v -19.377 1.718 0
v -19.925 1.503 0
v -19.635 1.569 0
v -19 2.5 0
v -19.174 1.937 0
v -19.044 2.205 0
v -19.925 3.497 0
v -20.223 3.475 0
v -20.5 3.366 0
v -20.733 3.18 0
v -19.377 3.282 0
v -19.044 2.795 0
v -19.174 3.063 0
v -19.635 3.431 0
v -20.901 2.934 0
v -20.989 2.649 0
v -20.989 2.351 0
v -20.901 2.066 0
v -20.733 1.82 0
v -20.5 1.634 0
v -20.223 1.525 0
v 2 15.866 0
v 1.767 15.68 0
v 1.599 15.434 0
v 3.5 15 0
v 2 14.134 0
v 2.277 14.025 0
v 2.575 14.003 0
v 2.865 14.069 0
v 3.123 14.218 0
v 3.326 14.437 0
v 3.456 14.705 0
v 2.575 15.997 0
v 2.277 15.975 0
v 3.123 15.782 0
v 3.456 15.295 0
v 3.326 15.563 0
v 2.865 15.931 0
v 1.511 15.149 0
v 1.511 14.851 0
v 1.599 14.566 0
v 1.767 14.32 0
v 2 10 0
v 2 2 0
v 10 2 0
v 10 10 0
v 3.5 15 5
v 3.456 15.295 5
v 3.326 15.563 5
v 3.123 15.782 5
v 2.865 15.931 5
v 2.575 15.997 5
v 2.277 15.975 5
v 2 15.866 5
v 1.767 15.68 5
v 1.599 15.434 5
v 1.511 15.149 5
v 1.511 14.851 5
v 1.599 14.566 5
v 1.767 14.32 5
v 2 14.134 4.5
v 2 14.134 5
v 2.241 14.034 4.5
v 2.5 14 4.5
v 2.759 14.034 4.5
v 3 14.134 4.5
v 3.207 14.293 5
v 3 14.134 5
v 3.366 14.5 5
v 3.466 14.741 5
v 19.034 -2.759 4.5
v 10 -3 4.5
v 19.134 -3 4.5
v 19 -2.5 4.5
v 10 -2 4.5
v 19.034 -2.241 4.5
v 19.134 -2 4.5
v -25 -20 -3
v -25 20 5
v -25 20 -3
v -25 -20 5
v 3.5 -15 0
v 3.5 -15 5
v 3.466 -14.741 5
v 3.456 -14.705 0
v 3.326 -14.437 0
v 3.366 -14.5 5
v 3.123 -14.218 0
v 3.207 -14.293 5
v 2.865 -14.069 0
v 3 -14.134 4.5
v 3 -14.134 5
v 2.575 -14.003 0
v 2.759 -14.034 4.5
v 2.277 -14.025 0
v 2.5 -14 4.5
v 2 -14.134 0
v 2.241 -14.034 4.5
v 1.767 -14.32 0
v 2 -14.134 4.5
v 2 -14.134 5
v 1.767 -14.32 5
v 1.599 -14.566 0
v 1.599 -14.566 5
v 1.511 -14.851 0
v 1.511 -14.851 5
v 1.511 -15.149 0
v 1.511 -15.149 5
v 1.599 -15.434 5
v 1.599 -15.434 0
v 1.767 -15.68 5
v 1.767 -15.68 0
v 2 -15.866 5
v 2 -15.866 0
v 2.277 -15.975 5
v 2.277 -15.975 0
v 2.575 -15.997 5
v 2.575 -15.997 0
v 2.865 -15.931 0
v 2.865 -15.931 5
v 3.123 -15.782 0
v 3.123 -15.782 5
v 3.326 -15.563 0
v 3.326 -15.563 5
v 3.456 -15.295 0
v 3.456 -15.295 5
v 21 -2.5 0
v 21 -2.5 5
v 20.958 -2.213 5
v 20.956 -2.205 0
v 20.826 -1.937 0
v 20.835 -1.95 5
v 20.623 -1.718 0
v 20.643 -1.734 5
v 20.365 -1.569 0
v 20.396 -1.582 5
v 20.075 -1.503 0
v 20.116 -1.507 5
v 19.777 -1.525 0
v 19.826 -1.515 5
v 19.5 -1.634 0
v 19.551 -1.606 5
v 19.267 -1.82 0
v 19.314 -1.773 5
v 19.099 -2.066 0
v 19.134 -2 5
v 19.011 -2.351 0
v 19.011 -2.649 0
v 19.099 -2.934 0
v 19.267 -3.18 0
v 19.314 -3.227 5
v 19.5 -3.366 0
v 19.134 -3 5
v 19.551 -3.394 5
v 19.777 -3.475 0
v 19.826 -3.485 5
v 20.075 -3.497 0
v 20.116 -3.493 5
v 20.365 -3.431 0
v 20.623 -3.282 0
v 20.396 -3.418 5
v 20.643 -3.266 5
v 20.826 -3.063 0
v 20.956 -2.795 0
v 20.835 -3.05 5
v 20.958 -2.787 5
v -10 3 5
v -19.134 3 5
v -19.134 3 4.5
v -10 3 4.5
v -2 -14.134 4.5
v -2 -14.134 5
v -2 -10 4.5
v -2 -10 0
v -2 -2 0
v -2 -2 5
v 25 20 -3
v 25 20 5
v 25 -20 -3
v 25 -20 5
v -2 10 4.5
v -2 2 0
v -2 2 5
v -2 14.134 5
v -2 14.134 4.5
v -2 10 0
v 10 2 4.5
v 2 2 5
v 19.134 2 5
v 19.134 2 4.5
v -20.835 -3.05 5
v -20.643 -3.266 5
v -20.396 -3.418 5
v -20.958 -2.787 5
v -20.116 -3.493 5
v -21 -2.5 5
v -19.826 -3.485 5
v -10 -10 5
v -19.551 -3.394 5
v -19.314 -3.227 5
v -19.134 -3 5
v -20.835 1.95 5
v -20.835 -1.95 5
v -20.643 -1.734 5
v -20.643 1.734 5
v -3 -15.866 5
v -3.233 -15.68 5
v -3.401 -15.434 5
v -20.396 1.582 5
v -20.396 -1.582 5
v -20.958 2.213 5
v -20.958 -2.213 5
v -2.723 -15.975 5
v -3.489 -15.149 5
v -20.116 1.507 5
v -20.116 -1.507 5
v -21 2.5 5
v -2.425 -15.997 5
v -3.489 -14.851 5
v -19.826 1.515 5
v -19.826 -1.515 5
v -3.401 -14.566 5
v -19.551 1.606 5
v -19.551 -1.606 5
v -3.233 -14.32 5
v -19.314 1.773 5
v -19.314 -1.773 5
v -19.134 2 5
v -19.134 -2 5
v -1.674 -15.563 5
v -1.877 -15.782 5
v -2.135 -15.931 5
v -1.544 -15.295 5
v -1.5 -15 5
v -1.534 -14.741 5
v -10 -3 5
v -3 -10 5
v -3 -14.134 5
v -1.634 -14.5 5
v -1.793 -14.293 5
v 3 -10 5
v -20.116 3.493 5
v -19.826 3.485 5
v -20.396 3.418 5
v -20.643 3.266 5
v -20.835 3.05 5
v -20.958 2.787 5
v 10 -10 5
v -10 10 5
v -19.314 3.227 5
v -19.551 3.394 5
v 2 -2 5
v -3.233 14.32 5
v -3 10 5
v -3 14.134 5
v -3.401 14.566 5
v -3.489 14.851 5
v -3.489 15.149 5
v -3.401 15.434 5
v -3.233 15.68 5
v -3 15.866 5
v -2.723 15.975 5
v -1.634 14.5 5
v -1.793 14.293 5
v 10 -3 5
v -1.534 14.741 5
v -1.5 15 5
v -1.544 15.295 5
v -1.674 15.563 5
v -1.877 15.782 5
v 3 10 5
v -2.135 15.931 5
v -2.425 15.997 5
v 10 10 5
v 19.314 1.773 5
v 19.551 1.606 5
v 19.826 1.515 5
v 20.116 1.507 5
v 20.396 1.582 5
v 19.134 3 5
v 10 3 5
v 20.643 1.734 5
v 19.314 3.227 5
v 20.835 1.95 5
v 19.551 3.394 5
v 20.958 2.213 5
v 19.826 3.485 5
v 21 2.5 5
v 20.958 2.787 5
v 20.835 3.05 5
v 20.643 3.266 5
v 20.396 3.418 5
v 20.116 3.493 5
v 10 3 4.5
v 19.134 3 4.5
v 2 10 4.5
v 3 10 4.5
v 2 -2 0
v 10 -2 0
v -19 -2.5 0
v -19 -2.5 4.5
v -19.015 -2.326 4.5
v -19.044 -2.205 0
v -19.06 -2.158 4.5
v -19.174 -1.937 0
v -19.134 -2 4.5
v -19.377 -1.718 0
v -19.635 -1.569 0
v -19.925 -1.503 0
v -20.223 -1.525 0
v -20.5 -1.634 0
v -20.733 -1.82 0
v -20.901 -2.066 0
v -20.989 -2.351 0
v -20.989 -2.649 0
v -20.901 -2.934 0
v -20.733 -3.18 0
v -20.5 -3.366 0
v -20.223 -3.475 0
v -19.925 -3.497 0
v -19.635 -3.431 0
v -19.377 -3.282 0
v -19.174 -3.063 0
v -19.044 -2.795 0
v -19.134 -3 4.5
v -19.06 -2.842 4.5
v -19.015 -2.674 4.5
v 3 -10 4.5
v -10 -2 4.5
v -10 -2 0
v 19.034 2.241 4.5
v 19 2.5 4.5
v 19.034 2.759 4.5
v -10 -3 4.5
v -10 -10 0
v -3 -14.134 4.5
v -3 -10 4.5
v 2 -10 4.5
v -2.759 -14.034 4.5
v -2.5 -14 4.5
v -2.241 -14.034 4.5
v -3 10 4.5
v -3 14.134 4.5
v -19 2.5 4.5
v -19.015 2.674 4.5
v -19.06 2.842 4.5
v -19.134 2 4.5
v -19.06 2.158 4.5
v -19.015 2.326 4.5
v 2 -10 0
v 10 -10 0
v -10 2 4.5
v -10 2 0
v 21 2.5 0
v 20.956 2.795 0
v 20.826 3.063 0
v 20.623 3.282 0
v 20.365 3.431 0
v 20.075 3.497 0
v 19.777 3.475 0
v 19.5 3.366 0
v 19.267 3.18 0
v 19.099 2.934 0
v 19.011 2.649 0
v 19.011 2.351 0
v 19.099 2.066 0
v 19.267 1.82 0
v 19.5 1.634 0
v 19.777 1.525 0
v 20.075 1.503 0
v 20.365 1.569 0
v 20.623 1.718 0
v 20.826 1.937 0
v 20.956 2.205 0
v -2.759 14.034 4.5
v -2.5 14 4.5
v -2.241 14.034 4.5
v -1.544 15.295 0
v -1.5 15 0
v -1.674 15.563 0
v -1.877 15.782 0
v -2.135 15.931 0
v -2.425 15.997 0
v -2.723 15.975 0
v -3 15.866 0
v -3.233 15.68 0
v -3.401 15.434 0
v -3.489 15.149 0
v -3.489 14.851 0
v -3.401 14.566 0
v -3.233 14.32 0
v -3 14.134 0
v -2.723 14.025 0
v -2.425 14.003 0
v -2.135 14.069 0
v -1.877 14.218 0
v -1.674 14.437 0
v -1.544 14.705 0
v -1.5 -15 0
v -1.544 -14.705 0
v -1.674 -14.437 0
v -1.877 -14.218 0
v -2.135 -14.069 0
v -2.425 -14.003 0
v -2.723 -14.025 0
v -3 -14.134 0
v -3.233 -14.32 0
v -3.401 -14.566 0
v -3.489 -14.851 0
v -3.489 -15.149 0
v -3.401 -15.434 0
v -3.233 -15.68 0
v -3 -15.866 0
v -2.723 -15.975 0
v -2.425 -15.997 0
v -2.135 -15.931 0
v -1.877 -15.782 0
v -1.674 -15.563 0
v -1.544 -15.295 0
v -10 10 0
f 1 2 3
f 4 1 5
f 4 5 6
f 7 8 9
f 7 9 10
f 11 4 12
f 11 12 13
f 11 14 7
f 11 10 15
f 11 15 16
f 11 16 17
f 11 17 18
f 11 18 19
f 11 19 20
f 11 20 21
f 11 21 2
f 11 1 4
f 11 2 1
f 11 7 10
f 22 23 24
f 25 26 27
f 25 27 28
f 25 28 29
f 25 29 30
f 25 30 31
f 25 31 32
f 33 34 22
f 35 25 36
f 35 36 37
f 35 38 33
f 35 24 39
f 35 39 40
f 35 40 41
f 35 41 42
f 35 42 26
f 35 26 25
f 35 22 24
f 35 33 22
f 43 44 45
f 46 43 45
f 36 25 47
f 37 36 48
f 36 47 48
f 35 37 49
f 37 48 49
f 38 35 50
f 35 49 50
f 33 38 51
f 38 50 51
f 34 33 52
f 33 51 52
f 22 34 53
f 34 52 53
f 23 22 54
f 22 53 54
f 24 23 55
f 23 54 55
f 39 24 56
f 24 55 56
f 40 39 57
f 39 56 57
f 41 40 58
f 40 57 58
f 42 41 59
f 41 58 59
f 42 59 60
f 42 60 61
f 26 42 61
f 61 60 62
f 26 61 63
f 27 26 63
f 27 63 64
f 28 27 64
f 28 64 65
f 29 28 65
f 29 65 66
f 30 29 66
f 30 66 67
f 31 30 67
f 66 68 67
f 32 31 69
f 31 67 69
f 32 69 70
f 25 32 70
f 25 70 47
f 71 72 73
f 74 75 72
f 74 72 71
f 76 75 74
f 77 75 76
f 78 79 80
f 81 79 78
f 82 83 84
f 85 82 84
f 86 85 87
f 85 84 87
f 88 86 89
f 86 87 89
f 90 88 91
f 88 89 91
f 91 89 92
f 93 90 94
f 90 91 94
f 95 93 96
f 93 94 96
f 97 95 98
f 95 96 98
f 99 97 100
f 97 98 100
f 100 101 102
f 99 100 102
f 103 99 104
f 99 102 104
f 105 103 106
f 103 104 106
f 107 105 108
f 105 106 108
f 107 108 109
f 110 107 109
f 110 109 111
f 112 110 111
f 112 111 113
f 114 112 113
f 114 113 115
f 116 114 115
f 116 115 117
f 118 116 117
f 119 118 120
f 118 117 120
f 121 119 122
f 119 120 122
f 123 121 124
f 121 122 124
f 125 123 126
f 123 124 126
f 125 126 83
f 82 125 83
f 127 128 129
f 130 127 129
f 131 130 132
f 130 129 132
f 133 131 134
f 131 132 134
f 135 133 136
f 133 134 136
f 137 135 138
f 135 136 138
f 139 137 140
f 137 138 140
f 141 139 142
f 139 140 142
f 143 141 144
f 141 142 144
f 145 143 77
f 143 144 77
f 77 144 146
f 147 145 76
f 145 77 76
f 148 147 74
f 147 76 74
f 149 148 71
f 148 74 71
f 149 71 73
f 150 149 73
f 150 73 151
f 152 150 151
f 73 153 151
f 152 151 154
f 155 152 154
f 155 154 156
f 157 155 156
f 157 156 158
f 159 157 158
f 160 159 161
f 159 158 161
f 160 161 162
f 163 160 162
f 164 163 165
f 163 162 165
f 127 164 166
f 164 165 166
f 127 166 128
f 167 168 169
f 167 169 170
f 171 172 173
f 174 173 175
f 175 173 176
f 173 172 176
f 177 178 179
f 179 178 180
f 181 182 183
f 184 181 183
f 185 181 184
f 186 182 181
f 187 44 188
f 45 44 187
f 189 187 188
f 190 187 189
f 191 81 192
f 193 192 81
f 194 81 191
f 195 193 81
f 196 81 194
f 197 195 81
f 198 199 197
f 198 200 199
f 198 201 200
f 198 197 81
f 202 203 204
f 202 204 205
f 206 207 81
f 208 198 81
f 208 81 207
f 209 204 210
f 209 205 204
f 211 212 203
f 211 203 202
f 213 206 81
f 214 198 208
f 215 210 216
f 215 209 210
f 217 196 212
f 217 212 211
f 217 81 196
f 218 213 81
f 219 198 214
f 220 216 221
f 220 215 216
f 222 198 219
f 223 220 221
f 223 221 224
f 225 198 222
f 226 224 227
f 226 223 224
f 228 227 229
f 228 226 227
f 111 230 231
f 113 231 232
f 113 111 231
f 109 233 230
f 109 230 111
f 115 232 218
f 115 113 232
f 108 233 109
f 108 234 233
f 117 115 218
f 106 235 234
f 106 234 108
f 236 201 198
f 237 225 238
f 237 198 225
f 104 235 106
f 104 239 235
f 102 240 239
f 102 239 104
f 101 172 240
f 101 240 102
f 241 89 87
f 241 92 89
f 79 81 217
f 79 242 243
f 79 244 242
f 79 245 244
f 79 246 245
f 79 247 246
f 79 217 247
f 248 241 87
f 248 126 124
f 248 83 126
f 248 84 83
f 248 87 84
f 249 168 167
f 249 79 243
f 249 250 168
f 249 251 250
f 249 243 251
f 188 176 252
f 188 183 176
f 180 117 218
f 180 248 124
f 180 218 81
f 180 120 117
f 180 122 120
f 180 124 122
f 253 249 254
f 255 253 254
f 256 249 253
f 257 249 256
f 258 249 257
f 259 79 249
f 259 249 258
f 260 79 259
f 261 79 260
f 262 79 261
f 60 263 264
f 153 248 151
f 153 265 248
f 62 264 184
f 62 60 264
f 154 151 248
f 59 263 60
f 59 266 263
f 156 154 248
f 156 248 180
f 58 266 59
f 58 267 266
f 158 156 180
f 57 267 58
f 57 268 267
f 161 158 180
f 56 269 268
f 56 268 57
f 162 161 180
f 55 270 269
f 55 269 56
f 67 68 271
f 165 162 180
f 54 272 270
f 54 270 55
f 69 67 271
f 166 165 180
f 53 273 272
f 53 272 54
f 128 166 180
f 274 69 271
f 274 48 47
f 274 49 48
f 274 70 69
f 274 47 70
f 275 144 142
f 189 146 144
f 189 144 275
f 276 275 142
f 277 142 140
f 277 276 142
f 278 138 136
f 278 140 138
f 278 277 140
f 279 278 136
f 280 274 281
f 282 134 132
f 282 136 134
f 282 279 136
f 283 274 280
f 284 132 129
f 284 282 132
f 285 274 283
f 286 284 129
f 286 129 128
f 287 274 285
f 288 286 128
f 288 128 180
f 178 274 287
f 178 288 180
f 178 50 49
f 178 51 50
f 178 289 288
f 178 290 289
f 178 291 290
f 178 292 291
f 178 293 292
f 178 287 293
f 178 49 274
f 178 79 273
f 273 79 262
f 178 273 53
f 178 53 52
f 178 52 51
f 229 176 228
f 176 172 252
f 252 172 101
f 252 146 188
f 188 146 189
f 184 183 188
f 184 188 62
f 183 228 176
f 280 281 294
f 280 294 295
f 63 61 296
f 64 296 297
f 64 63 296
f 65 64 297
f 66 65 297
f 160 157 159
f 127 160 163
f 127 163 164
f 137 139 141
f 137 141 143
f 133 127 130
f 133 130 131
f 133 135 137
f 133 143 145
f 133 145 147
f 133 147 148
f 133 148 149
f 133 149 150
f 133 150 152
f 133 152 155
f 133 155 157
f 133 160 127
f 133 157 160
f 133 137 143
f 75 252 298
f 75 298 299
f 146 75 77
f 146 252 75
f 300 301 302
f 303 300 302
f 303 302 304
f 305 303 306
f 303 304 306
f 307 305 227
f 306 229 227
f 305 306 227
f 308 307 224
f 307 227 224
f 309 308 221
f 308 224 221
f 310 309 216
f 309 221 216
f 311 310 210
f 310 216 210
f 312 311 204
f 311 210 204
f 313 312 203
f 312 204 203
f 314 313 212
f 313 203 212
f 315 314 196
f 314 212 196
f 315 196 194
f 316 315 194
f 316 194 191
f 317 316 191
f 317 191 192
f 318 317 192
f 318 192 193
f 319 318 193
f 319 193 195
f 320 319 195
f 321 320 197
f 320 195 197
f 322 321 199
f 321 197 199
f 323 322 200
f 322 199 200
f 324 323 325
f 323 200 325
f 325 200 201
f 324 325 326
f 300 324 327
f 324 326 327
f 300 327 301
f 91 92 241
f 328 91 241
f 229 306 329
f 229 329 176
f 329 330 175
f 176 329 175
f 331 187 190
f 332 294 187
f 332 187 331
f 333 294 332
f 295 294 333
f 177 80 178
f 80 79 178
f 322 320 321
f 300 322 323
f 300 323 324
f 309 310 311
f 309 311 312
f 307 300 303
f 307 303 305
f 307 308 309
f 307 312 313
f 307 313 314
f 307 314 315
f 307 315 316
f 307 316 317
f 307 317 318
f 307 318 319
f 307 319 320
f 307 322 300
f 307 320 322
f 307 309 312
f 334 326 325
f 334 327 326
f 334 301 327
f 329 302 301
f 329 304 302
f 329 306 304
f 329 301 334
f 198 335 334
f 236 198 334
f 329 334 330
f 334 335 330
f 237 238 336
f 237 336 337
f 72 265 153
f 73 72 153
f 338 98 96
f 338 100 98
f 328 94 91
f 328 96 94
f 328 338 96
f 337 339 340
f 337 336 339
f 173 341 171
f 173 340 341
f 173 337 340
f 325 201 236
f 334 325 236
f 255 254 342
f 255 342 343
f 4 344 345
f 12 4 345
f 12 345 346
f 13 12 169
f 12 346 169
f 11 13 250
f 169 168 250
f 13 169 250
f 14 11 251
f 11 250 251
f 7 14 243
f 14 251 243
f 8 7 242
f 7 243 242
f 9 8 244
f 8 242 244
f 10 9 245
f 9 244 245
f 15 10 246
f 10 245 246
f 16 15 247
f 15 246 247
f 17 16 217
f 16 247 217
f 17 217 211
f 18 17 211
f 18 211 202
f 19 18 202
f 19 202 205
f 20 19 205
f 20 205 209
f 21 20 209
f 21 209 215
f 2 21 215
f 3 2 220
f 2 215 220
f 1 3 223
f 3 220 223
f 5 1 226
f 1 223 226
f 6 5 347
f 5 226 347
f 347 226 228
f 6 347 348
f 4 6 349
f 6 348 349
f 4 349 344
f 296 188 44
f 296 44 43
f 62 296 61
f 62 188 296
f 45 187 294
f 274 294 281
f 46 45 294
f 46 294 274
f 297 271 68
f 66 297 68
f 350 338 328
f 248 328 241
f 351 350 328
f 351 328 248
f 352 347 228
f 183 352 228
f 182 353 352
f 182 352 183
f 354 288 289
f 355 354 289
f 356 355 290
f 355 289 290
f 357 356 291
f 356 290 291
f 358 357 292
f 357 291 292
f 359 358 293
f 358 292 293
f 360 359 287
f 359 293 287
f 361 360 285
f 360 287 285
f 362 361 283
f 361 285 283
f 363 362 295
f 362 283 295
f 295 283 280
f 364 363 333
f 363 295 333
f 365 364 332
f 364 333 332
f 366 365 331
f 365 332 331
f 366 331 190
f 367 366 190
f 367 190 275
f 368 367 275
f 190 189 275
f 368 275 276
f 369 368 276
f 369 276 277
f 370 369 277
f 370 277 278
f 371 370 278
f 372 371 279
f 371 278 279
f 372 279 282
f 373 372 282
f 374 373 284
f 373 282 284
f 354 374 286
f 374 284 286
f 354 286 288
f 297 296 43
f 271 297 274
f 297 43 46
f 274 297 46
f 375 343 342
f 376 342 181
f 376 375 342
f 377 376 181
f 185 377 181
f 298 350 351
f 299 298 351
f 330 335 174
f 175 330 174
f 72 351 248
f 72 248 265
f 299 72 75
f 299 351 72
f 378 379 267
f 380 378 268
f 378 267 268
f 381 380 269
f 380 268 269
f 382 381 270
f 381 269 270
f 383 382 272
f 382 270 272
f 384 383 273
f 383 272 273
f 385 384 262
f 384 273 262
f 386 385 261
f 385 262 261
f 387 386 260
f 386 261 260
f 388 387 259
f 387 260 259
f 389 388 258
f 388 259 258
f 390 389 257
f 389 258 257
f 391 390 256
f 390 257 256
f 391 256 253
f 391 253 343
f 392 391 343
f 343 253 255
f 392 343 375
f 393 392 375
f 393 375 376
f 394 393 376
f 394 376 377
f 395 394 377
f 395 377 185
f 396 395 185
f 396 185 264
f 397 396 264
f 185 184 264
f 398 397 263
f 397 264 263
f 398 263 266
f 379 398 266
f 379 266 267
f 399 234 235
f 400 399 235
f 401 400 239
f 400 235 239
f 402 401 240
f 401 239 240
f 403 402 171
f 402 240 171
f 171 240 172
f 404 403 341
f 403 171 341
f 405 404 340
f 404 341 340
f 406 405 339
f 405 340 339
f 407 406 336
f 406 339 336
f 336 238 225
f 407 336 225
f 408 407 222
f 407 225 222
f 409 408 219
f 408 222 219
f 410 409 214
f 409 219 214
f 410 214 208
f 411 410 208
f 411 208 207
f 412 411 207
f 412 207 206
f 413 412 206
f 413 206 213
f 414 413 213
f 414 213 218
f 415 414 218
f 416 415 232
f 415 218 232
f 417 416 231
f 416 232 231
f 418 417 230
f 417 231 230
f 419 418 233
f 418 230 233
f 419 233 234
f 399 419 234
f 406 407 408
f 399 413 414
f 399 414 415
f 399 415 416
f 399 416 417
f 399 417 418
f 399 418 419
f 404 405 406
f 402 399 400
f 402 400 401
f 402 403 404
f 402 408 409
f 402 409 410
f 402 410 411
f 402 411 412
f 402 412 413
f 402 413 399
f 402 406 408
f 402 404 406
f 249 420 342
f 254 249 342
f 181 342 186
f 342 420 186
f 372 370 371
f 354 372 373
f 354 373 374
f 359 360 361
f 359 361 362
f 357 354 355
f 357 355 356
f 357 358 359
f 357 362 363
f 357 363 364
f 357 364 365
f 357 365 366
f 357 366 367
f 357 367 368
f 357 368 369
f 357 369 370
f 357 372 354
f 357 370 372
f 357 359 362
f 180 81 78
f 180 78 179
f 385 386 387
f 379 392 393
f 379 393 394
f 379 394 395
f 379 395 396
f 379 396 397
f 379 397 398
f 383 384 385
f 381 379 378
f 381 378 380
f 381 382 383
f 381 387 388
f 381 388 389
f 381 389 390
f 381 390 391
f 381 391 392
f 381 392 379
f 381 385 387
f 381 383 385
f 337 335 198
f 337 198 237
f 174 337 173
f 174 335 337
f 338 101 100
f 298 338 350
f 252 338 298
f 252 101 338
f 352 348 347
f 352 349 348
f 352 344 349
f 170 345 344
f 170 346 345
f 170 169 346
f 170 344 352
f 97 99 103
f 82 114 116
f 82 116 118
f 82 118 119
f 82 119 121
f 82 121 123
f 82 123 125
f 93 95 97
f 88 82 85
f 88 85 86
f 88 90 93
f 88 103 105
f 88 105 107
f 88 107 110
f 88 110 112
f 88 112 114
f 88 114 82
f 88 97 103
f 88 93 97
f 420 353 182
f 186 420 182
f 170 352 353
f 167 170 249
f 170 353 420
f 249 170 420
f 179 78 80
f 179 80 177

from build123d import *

# Parameters (mm, degrees)
F0_W     = 8
F0_H     = 8
F1_DEPTH = 5
F2_W     = 50
F2_H     = 40
F3_DEPTH = 3
F4_W     = 1
F4_H     = 5
F4_W_2   = 10
F4_H_2   = 1
F5_DEPTH = 0.5
F6_R     = 1
F7_DEPTH = 5


with BuildPart() as f1:
    # F0 (on Top) → F1 (new body)
    with BuildSketch(Plane.XY):
        Polygon((-25, -20), (25, -20), (25, 20), (-10, 20), (-25, 20), align=None)
        with Locations((-6, -6)):
            Rectangle(F0_W, F0_H, mode=Mode.SUBTRACT)
        with Locations((6, -6)):
            Rectangle(F0_W, F0_H, mode=Mode.SUBTRACT)
        with Locations((-6, 6)):
            Rectangle(F0_W, F0_H, mode=Mode.SUBTRACT)
        with Locations((6, 6)):
            Rectangle(F0_W, F0_H, mode=Mode.SUBTRACT)
    extrude(amount=F1_DEPTH)

    # F2 (on face) → F3 (join)
    with BuildSketch(Plane(origin=(0, 0, 0), x_dir=(1, 0, 0), z_dir=(0, 0, -1))):
        Rectangle(F2_W, F2_H)
    extrude(amount=F3_DEPTH)

    # F4 (on face) → F5 (cut)
    with BuildSketch(Plane.XY.offset(5)):
        with Locations((2.5, -12.5)):
            Rectangle(F4_W, F4_H)
        with Locations((-2.5, -12.5)):
            Rectangle(F4_W, F4_H)
        with Locations((-2.5, 12.5)):
            Rectangle(F4_W, F4_H)
        with Locations((2.5, 12.5)):
            Rectangle(F4_W, F4_H)
        with Locations((15, -2.5)):
            Rectangle(F4_W_2, F4_H_2)
        with Locations((15, 2.5)):
            Rectangle(F4_W_2, F4_H_2)
        with Locations((-15, 2.5)):
            Rectangle(F4_W_2, F4_H_2)
        with Locations((-15, -2.5)):
            Rectangle(F4_W_2, F4_H_2)
    extrude(amount=-F5_DEPTH, mode=Mode.SUBTRACT)

    # F6 (on face) → F7 (cut)
    with BuildSketch(Plane.XY.offset(5)):
        with Locations((20, -2.5)):
            Circle(F6_R)
        with Locations((20, 2.5)):
            Circle(F6_R)
        with Locations((-20, -2.5)):
            Circle(F6_R)
        with Locations((-20, 2.5)):
            Circle(F6_R)
        with Locations((2.5, -15)):
            Circle(F6_R)
        with Locations((-2.5, -15)):
            Circle(F6_R)
        with Locations((2.5, 15)):
            Circle(F6_R)
        with Locations((-2.5, 15)):
            Circle(F6_R)
    extrude(amount=-F7_DEPTH, mode=Mode.SUBTRACT)


solid = f1.part
